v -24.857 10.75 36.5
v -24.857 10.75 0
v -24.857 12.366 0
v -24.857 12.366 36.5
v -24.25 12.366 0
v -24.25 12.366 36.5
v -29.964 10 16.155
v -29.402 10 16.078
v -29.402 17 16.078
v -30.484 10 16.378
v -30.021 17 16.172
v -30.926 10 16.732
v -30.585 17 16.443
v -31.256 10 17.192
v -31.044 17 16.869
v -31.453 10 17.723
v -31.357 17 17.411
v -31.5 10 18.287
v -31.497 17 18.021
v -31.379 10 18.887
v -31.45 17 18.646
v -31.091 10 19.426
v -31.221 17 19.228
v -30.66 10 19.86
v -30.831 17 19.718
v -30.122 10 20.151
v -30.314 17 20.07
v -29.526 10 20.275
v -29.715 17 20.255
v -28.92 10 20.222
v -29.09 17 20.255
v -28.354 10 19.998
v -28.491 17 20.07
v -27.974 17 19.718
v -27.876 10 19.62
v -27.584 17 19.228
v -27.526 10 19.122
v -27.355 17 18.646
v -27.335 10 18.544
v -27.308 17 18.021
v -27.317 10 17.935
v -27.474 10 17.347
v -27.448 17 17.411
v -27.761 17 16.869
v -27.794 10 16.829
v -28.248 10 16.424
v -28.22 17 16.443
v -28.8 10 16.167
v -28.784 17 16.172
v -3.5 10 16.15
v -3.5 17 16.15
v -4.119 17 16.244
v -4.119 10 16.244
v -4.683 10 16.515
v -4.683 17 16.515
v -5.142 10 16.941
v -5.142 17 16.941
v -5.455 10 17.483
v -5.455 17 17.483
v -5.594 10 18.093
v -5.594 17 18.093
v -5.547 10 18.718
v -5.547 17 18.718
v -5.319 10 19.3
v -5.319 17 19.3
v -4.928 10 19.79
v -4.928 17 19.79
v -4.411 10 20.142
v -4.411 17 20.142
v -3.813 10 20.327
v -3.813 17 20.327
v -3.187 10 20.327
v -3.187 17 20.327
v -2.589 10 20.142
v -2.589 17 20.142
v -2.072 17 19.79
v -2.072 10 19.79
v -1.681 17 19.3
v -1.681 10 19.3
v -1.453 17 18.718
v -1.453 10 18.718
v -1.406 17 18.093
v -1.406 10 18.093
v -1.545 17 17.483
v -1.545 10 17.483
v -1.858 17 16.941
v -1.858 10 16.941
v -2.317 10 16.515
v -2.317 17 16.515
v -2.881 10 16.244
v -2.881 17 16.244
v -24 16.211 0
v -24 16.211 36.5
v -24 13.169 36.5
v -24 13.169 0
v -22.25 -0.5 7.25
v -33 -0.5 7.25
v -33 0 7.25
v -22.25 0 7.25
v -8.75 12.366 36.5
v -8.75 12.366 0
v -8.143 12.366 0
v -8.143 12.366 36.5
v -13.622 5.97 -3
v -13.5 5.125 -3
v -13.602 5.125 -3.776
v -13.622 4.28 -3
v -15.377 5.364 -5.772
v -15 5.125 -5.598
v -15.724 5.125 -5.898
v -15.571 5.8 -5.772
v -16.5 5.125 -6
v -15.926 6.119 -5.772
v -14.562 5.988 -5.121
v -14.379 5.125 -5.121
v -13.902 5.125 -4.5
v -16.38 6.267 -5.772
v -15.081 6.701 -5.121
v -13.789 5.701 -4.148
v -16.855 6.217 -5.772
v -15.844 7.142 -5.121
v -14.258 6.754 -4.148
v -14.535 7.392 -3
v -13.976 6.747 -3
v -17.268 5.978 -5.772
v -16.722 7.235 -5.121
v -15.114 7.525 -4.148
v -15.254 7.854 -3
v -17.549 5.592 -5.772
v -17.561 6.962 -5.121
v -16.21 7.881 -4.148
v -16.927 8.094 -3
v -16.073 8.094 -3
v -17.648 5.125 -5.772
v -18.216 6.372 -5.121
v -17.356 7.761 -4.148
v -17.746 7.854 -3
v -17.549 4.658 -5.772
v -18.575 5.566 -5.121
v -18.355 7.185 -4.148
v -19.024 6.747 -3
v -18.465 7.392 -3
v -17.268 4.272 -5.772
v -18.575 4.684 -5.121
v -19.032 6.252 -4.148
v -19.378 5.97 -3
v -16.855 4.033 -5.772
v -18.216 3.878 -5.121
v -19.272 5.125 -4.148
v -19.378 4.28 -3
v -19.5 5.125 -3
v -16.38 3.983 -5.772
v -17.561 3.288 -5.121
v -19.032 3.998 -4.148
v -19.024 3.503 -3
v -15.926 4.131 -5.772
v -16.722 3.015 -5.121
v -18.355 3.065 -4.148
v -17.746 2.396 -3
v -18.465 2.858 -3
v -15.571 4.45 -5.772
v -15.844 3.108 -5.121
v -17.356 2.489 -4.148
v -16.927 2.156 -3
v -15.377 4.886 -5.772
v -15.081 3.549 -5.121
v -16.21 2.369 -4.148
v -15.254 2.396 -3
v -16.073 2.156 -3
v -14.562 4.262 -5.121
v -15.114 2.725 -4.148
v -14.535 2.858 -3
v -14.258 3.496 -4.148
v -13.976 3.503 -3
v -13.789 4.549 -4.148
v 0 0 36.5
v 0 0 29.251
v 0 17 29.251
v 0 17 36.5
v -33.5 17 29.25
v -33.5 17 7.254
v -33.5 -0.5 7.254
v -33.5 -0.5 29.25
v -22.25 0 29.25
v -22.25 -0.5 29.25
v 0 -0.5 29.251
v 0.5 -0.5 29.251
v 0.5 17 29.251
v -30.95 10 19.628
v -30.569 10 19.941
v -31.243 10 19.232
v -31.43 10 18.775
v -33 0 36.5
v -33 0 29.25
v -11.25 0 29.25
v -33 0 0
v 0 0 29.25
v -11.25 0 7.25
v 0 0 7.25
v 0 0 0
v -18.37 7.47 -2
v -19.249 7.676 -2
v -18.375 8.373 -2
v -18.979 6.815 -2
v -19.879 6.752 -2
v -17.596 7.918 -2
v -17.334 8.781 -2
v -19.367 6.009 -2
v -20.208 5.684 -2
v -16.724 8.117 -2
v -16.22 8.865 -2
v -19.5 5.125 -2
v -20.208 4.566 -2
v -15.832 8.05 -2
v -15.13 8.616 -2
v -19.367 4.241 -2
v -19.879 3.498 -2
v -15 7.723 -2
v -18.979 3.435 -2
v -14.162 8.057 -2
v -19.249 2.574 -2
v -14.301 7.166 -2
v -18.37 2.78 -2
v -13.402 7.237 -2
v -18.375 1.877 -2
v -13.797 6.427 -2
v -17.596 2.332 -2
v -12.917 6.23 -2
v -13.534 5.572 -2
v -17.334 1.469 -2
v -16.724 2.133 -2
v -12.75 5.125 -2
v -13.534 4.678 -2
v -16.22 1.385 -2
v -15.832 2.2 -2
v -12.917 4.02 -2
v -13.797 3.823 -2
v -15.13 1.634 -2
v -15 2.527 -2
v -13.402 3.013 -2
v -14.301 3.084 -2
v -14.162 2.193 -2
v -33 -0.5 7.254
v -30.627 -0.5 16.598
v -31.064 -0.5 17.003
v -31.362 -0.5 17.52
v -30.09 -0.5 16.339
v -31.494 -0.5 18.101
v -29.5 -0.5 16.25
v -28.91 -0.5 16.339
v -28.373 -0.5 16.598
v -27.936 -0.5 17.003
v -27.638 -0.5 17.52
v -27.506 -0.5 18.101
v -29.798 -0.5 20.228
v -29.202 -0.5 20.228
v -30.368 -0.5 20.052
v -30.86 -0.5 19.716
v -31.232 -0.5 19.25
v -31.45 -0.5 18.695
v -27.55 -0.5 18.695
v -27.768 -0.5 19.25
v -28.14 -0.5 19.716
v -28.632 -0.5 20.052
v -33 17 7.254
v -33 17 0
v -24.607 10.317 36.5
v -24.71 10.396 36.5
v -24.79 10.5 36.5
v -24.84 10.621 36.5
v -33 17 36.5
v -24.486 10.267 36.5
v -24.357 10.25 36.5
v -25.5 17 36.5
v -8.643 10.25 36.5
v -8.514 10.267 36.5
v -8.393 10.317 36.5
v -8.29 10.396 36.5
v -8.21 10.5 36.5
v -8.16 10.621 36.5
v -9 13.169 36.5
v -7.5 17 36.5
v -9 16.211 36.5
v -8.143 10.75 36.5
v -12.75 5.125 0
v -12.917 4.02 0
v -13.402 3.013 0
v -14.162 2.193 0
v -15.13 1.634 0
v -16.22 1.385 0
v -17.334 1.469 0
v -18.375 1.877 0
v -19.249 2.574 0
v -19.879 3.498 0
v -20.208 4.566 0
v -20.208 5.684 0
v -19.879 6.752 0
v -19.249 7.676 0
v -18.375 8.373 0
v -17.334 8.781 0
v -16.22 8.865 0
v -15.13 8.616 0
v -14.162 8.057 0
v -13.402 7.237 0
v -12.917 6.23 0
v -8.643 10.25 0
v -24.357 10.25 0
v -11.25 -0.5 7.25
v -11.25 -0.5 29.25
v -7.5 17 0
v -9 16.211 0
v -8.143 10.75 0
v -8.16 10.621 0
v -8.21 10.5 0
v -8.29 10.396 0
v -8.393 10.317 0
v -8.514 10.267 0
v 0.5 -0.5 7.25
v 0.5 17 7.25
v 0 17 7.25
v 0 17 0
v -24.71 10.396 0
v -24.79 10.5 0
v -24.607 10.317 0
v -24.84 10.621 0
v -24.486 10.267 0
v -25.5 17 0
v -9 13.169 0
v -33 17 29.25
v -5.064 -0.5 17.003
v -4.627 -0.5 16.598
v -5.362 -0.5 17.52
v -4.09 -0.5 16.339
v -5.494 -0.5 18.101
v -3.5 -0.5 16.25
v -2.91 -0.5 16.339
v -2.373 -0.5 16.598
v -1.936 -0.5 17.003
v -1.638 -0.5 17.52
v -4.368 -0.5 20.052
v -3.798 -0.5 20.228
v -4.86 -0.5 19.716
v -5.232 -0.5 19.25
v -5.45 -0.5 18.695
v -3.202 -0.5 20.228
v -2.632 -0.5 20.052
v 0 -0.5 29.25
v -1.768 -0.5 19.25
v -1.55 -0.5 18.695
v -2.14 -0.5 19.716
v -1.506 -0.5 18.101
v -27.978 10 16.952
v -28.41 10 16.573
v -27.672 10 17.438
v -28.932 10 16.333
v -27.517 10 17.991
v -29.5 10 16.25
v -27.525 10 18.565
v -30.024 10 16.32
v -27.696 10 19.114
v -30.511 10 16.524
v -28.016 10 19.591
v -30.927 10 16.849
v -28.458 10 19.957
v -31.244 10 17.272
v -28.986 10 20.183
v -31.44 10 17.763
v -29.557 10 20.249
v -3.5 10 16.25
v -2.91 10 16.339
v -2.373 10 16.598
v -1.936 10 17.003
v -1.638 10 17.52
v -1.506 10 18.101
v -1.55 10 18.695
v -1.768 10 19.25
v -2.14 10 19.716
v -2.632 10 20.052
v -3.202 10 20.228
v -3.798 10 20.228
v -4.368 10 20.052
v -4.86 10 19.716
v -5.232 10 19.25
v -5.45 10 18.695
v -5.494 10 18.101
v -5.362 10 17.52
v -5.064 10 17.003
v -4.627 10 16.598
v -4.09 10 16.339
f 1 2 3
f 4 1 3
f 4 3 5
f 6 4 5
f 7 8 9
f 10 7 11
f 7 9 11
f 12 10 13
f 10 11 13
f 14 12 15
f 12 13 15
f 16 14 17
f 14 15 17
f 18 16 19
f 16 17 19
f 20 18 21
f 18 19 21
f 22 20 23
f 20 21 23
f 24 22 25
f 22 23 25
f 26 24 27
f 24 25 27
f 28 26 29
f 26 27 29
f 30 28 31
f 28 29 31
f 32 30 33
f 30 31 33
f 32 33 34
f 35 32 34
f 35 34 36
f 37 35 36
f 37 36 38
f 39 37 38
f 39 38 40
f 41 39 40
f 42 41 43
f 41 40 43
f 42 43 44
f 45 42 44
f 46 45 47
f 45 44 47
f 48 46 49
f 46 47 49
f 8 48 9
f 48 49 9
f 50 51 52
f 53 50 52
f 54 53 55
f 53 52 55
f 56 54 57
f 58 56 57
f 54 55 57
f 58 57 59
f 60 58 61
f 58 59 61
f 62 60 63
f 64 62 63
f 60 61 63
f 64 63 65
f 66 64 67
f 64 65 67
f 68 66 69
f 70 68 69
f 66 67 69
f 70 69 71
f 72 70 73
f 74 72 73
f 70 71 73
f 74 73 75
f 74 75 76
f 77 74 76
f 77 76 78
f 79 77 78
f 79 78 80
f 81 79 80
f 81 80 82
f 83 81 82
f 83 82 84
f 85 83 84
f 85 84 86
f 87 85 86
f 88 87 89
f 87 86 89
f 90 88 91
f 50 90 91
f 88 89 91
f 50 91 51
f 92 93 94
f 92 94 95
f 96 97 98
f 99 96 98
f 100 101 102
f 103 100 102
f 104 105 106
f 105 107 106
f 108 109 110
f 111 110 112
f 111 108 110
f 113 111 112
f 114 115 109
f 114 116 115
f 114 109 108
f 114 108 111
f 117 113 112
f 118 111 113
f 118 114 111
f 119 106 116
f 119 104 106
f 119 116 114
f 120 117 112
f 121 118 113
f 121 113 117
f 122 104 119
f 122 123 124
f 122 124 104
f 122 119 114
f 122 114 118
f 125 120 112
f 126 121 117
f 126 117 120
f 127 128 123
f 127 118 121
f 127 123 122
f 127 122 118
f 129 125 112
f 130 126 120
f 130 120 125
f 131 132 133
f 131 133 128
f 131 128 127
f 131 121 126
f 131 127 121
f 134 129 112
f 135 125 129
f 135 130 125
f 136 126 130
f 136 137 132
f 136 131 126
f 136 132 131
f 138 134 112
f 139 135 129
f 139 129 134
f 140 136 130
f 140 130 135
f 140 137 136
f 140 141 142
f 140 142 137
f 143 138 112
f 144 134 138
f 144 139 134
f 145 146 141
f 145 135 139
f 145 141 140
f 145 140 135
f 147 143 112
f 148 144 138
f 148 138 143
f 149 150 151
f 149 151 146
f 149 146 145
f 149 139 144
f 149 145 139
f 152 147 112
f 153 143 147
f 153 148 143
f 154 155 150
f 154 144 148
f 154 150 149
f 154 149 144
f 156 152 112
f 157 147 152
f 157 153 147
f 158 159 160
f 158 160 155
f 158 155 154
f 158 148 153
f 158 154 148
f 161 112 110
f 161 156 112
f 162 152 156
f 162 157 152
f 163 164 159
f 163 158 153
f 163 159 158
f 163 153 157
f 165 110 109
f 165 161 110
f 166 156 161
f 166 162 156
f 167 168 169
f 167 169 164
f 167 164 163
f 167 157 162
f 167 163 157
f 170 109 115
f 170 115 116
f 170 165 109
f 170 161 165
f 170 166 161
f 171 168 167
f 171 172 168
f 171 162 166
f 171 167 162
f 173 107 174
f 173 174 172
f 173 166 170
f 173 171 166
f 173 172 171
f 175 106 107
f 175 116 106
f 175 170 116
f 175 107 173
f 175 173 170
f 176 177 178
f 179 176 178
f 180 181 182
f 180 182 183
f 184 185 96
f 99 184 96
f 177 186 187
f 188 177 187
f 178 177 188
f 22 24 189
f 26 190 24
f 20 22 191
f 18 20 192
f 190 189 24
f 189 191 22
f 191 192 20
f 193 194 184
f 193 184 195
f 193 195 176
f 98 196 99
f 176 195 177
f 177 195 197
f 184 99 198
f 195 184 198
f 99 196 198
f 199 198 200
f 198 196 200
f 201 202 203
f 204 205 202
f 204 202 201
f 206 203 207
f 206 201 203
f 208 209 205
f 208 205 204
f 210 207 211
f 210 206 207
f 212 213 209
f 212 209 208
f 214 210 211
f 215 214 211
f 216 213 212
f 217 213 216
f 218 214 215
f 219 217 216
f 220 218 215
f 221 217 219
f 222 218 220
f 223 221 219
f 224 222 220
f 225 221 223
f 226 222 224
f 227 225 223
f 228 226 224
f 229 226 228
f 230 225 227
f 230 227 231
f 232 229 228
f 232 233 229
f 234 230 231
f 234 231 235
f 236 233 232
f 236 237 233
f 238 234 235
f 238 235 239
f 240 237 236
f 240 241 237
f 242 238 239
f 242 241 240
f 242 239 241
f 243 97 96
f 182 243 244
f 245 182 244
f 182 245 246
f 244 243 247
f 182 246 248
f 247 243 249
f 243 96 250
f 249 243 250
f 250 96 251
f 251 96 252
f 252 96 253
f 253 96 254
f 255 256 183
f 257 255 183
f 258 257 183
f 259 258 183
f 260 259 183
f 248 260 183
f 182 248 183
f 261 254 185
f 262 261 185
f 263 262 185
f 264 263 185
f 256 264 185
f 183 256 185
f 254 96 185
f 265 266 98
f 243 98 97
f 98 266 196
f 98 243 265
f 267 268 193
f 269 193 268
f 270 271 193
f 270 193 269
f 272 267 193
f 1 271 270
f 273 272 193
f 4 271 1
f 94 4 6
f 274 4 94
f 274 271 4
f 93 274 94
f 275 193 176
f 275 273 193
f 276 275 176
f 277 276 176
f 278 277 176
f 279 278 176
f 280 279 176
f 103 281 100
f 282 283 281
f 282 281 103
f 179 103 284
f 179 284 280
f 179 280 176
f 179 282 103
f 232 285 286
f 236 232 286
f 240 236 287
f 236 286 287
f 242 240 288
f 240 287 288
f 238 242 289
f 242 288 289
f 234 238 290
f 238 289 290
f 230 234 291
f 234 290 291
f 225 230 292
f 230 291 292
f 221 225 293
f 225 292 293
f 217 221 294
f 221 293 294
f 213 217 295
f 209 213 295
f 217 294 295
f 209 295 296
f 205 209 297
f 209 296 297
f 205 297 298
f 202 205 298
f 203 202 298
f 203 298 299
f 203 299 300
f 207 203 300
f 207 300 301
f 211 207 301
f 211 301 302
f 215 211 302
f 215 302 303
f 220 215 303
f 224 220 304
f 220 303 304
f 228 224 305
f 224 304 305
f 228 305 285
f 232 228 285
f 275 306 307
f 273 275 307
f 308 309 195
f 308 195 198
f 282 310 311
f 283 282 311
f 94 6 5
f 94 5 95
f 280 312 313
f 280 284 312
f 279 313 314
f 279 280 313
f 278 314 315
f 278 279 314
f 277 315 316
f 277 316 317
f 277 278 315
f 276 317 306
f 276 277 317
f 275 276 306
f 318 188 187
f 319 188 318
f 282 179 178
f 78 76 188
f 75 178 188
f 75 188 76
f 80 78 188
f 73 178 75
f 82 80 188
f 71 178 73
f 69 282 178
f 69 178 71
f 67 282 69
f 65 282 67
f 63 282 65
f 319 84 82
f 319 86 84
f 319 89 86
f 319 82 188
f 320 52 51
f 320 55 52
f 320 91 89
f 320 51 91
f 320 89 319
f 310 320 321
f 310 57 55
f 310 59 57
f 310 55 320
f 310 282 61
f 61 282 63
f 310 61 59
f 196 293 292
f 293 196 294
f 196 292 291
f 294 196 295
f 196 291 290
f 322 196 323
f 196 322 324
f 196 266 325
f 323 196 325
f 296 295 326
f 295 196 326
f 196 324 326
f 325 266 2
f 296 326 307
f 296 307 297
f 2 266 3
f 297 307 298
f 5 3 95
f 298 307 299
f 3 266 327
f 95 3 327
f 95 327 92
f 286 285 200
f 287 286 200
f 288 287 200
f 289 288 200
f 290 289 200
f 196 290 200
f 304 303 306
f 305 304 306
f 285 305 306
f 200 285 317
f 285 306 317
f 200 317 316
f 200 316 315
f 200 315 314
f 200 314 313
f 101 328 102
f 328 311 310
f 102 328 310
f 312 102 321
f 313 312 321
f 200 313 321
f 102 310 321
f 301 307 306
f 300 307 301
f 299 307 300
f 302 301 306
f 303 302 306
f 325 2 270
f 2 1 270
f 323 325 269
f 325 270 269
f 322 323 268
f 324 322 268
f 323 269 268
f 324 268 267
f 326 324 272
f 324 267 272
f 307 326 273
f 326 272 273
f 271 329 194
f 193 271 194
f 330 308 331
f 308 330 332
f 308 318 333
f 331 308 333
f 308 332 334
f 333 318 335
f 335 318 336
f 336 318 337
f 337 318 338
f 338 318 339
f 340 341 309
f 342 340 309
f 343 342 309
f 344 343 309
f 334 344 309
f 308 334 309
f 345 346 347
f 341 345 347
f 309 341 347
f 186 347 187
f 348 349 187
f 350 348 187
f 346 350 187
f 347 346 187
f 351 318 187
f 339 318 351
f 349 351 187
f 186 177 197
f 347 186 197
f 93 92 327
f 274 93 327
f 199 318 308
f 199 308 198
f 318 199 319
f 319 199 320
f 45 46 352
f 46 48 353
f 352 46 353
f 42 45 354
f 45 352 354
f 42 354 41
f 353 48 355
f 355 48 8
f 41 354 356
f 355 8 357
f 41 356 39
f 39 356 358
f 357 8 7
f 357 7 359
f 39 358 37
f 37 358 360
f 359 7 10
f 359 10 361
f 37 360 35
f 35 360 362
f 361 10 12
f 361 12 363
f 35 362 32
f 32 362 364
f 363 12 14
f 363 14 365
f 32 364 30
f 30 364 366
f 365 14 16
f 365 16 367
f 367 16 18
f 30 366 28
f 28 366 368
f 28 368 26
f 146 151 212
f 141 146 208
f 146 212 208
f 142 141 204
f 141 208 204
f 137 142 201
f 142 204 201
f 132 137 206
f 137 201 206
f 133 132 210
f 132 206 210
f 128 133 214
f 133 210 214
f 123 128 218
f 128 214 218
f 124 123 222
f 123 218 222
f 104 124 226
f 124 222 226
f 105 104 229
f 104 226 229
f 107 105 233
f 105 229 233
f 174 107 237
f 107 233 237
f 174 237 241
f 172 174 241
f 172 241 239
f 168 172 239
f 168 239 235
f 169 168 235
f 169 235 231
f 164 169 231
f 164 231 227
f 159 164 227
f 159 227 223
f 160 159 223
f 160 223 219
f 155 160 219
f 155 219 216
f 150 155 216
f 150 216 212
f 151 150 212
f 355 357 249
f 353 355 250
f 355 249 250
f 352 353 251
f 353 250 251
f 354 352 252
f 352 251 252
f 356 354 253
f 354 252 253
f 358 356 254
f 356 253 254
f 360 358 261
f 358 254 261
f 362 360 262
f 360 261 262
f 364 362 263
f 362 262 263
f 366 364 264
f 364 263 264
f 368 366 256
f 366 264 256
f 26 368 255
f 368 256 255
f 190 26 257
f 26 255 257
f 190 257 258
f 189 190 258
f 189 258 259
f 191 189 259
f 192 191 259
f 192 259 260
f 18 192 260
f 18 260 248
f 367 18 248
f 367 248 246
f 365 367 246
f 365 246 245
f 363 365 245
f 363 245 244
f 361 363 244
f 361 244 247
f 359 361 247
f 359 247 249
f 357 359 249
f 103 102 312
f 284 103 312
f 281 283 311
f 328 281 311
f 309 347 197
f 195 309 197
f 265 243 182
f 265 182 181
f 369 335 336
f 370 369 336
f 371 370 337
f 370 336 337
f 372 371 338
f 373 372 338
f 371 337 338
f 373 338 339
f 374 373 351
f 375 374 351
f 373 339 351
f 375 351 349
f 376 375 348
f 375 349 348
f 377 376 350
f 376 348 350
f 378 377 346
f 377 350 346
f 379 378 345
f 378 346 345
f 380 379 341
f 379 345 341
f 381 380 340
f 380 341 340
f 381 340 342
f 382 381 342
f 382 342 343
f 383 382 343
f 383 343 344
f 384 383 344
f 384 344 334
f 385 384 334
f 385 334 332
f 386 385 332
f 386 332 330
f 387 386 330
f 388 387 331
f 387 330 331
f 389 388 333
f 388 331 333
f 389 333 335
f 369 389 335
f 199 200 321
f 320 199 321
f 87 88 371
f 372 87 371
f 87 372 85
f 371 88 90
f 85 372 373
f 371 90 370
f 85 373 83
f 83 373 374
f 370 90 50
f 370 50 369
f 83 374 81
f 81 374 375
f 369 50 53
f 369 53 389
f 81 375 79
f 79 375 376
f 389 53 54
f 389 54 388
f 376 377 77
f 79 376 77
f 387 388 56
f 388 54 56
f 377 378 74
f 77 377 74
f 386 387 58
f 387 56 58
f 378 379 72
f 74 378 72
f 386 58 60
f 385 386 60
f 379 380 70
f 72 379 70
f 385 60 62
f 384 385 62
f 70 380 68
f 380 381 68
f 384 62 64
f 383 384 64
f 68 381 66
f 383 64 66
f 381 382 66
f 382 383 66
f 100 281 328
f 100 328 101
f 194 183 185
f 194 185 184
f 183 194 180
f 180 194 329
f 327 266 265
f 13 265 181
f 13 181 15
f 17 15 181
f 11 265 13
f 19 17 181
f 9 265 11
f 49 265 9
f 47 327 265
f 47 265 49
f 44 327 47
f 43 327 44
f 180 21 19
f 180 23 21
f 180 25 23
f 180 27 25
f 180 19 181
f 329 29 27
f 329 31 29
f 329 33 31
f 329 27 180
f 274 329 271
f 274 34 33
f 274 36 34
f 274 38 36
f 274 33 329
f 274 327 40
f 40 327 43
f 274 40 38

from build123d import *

# Parameters (mm, degrees)
BOSS_EXTRU_2_DEPTH         = 36.5
CONG_1_R                   = 0.5
ESQUISSE2_R                = 3.75
BOSS_EXTRU_3_DEPTH         = 2
ESQUISSE3_R                = 3
BOSS_EXTRU_4_DEPTH         = 1
ESQUISSE5_W                = 7.5
ESQUISSE5_H                = 37.315621328
ENL_V_MAT_EXTRU_2_DEPTH    = 5
ESQUISSE6_W                = 33
ESQUISSE6_H                = 22
BOSS_EXTRU_6_DEPTH         = 0.5
ESQUISSE7_W                = 22.000592026
ESQUISSE7_H                = 17.5
BOSS_EXTRU_7_DEPTH         = 0.5
ESQUISSE8_W                = 21.996306334
ESQUISSE8_H                = 17.5
BOSS_EXTRU_8_DEPTH         = 0.5
ESQUISSE9_W                = 5.5
ESQUISSE9_H                = 22
ENL_V_MAT_EXTRU_3_DEPTH    = 0.5
ESQUISSE10_R               = 2
ENL_V_MAT_EXTRU_4_DEPTH    = 10.5
ESQUISSE11_W               = 2.1
ESQUISSE11_H               = 7.00005
TROU_TARAUD_M51_AT_2_COUNT = 2
TROU_TARAUD_M51_AT_2_PITCH = 25.902595086


# Read off the part's stored shape, not the designer's step: Dôme1
with BuildPart() as part:
    # Esquisse1 → Boss.-Extru.2 (new body)
    with BuildSketch(Plane.XY):
        Polygon((-16.5, 0), (-16.5, 10.25), (-22.270485302, 10.25), (-24.856553081, 10.25), (-24.856553081, 12.366468473), (-24.25, 12.366468473), (-23.5, 14.775104227), (-23.5, 15.186461692), (-23, 15.684420728), (-25.5, 17), (-33, 17), (-33, 0), align=None)
        Polygon((-10.729514698, 10.25), (-16.5, 10.25), (-16.5, 0), (0, 0), (0, 17), (-7.5, 17), (-10, 15.684420728), (-9.5, 15.186461692), (-9.5, 14.775104227), (-8.75, 12.366468473), (-8.143446919, 12.366468473), (-8.143446919, 10.25), align=None)
    extrude(amount=BOSS_EXTRU_2_DEPTH)

    # Congé1
    cong_1_edges = [part.edges().sort_by_distance(p)[0] for p in [
        (-23.5, 15.186461692, 18.25),
        (-24.856553081, 10.25, 18.25),
        (-8.143446919, 10.25, 18.25),
        (-9.5, 15.186461692, 18.25),
    ]]
    fillet(cong_1_edges, radius=CONG_1_R)

    # Esquisse2 → Boss.-Extru.3 (add)
    with BuildSketch(Plane(origin=(0, 0, 0), x_dir=(-1, 0, 0), z_dir=(0, 0, -1))):
        with Locations(Location((16.5, 5.125, 0), (0, 0, 180))):
            Circle(ESQUISSE2_R)
    extrude(amount=BOSS_EXTRU_3_DEPTH)

    # Esquisse3 → Boss.-Extru.4 (add)
    with BuildSketch(Plane(origin=(0, 0, -2), x_dir=(-1, 0, 0), z_dir=(0, 0, -1))):
        with Locations((16.5, 5.125)):
            Circle(ESQUISSE3_R)
    extrude(amount=BOSS_EXTRU_4_DEPTH)

    # Dôme1 outline → Dôme1 (revolve)
    with BuildSketch(Plane(origin=(-16.5, 5.125, 0), x_dir=(1, 0, 0), z_dir=(0, -1, 0))):
        with BuildLine():
            Line((0, -2.999999997), (0, -6))
            ThreePointArc((0, -6), (2.121320345, -5.121320342), (3, -2.999999997))
            Line((3, -2.999999997), (0, -2.999999997))
        make_face()
    revolve(axis=Axis((-16.5, 5.125, 0), (0, 0, 1)))

    # Esquisse5 → Enlèv. mat.-Extru.2 (cut)
    with BuildSketch(Plane(origin=(0, 17, 0), x_dir=(1, 0, 0), z_dir=(0, 1, 0))):
        with Locations((-12.75, -18.657810664)):
            Rectangle(ESQUISSE5_W, ESQUISSE5_H)
        with Locations((-20.25, -18.657810664)):
            Rectangle(ESQUISSE5_W, ESQUISSE5_H)
    extrude(amount=-ENL_V_MAT_EXTRU_2_DEPTH, mode=Mode.SUBTRACT)

    # Esquisse6 → Boss.-Extru.6 (add)
    with BuildSketch(Plane(origin=(0, 0, 0), x_dir=(-1, 0, 0), z_dir=(0, -1, 0))):
        with Locations((16.5, -18.25)):
            Rectangle(ESQUISSE6_W, ESQUISSE6_H)
    extrude(amount=BOSS_EXTRU_6_DEPTH)

    # Esquisse7 → Boss.-Extru.7 (add)
    with BuildSketch(Plane(origin=(0, 0, 0), x_dir=(0, 0, -1), z_dir=(1, 0, 0))):
        with Locations((-18.250296013, 8.25)):
            Rectangle(ESQUISSE7_W, ESQUISSE7_H)
    extrude(amount=BOSS_EXTRU_7_DEPTH)

    # Esquisse8 → Boss.-Extru.8 (add)
    with BuildSketch(Plane.ZY.offset(33)):
        with Locations((18.251846833, 8.25)):
            Rectangle(ESQUISSE8_W, ESQUISSE8_H)
    extrude(amount=BOSS_EXTRU_8_DEPTH)

    # Esquisse9 → Enlèv. mat.-Extru.3 (cut)
    with BuildSketch(Plane(origin=(0, -0.5, 0), x_dir=(-1, 0, 0), z_dir=(0, -1, 0))):
        with Locations((14, -18.25)):
            Rectangle(ESQUISSE9_W, ESQUISSE9_H)
        with Locations((19.5, -18.25)):
            Rectangle(ESQUISSE9_W, ESQUISSE9_H)
    extrude(amount=-ENL_V_MAT_EXTRU_3_DEPTH, mode=Mode.SUBTRACT)

    # Esquisse10 → Enlèv. mat.-Extru.4 (cut)
    with BuildSketch(Plane.XZ.offset(0.5)):
        with Locations(Location((-3.5, 18.250296013, 0), (0, 0, 270))):
            Circle(ESQUISSE10_R)
        with Locations(Location((-29.5, 18.250296013, 0), (0, 0, 270))):
            Circle(ESQUISSE10_R)
    extrude(amount=-ENL_V_MAT_EXTRU_4_DEPTH, mode=Mode.SUBTRACT)

    # Esquisse11 → Trou taraudé M51 (revolve, cut)
    with BuildSketch(Plane(origin=(-29.402494858, 10, 18.178238283), x_dir=(0, 0, -1), z_dir=(1, 0, 0))):
        with Locations((1.05, 3.500025)):
            Rectangle(ESQUISSE11_W, ESQUISSE11_H)
    trou_taraud_m51 = revolve(axis=Axis((-29.402494858, 3.65, 18.178238283), (0, 1, 0)), mode=Mode.SUBTRACT)

    # Trou taraudé M51 at 2: Trou taraudé M51 ×2
    with Locations(*[Vector(0.9999961305838194, 0, 0.002781873000113731) * (i * TROU_TARAUD_M51_AT_2_PITCH) for i in range(1, TROU_TARAUD_M51_AT_2_COUNT)]):
        add(trou_taraud_m51, mode=Mode.SUBTRACT)


solid = part.part
